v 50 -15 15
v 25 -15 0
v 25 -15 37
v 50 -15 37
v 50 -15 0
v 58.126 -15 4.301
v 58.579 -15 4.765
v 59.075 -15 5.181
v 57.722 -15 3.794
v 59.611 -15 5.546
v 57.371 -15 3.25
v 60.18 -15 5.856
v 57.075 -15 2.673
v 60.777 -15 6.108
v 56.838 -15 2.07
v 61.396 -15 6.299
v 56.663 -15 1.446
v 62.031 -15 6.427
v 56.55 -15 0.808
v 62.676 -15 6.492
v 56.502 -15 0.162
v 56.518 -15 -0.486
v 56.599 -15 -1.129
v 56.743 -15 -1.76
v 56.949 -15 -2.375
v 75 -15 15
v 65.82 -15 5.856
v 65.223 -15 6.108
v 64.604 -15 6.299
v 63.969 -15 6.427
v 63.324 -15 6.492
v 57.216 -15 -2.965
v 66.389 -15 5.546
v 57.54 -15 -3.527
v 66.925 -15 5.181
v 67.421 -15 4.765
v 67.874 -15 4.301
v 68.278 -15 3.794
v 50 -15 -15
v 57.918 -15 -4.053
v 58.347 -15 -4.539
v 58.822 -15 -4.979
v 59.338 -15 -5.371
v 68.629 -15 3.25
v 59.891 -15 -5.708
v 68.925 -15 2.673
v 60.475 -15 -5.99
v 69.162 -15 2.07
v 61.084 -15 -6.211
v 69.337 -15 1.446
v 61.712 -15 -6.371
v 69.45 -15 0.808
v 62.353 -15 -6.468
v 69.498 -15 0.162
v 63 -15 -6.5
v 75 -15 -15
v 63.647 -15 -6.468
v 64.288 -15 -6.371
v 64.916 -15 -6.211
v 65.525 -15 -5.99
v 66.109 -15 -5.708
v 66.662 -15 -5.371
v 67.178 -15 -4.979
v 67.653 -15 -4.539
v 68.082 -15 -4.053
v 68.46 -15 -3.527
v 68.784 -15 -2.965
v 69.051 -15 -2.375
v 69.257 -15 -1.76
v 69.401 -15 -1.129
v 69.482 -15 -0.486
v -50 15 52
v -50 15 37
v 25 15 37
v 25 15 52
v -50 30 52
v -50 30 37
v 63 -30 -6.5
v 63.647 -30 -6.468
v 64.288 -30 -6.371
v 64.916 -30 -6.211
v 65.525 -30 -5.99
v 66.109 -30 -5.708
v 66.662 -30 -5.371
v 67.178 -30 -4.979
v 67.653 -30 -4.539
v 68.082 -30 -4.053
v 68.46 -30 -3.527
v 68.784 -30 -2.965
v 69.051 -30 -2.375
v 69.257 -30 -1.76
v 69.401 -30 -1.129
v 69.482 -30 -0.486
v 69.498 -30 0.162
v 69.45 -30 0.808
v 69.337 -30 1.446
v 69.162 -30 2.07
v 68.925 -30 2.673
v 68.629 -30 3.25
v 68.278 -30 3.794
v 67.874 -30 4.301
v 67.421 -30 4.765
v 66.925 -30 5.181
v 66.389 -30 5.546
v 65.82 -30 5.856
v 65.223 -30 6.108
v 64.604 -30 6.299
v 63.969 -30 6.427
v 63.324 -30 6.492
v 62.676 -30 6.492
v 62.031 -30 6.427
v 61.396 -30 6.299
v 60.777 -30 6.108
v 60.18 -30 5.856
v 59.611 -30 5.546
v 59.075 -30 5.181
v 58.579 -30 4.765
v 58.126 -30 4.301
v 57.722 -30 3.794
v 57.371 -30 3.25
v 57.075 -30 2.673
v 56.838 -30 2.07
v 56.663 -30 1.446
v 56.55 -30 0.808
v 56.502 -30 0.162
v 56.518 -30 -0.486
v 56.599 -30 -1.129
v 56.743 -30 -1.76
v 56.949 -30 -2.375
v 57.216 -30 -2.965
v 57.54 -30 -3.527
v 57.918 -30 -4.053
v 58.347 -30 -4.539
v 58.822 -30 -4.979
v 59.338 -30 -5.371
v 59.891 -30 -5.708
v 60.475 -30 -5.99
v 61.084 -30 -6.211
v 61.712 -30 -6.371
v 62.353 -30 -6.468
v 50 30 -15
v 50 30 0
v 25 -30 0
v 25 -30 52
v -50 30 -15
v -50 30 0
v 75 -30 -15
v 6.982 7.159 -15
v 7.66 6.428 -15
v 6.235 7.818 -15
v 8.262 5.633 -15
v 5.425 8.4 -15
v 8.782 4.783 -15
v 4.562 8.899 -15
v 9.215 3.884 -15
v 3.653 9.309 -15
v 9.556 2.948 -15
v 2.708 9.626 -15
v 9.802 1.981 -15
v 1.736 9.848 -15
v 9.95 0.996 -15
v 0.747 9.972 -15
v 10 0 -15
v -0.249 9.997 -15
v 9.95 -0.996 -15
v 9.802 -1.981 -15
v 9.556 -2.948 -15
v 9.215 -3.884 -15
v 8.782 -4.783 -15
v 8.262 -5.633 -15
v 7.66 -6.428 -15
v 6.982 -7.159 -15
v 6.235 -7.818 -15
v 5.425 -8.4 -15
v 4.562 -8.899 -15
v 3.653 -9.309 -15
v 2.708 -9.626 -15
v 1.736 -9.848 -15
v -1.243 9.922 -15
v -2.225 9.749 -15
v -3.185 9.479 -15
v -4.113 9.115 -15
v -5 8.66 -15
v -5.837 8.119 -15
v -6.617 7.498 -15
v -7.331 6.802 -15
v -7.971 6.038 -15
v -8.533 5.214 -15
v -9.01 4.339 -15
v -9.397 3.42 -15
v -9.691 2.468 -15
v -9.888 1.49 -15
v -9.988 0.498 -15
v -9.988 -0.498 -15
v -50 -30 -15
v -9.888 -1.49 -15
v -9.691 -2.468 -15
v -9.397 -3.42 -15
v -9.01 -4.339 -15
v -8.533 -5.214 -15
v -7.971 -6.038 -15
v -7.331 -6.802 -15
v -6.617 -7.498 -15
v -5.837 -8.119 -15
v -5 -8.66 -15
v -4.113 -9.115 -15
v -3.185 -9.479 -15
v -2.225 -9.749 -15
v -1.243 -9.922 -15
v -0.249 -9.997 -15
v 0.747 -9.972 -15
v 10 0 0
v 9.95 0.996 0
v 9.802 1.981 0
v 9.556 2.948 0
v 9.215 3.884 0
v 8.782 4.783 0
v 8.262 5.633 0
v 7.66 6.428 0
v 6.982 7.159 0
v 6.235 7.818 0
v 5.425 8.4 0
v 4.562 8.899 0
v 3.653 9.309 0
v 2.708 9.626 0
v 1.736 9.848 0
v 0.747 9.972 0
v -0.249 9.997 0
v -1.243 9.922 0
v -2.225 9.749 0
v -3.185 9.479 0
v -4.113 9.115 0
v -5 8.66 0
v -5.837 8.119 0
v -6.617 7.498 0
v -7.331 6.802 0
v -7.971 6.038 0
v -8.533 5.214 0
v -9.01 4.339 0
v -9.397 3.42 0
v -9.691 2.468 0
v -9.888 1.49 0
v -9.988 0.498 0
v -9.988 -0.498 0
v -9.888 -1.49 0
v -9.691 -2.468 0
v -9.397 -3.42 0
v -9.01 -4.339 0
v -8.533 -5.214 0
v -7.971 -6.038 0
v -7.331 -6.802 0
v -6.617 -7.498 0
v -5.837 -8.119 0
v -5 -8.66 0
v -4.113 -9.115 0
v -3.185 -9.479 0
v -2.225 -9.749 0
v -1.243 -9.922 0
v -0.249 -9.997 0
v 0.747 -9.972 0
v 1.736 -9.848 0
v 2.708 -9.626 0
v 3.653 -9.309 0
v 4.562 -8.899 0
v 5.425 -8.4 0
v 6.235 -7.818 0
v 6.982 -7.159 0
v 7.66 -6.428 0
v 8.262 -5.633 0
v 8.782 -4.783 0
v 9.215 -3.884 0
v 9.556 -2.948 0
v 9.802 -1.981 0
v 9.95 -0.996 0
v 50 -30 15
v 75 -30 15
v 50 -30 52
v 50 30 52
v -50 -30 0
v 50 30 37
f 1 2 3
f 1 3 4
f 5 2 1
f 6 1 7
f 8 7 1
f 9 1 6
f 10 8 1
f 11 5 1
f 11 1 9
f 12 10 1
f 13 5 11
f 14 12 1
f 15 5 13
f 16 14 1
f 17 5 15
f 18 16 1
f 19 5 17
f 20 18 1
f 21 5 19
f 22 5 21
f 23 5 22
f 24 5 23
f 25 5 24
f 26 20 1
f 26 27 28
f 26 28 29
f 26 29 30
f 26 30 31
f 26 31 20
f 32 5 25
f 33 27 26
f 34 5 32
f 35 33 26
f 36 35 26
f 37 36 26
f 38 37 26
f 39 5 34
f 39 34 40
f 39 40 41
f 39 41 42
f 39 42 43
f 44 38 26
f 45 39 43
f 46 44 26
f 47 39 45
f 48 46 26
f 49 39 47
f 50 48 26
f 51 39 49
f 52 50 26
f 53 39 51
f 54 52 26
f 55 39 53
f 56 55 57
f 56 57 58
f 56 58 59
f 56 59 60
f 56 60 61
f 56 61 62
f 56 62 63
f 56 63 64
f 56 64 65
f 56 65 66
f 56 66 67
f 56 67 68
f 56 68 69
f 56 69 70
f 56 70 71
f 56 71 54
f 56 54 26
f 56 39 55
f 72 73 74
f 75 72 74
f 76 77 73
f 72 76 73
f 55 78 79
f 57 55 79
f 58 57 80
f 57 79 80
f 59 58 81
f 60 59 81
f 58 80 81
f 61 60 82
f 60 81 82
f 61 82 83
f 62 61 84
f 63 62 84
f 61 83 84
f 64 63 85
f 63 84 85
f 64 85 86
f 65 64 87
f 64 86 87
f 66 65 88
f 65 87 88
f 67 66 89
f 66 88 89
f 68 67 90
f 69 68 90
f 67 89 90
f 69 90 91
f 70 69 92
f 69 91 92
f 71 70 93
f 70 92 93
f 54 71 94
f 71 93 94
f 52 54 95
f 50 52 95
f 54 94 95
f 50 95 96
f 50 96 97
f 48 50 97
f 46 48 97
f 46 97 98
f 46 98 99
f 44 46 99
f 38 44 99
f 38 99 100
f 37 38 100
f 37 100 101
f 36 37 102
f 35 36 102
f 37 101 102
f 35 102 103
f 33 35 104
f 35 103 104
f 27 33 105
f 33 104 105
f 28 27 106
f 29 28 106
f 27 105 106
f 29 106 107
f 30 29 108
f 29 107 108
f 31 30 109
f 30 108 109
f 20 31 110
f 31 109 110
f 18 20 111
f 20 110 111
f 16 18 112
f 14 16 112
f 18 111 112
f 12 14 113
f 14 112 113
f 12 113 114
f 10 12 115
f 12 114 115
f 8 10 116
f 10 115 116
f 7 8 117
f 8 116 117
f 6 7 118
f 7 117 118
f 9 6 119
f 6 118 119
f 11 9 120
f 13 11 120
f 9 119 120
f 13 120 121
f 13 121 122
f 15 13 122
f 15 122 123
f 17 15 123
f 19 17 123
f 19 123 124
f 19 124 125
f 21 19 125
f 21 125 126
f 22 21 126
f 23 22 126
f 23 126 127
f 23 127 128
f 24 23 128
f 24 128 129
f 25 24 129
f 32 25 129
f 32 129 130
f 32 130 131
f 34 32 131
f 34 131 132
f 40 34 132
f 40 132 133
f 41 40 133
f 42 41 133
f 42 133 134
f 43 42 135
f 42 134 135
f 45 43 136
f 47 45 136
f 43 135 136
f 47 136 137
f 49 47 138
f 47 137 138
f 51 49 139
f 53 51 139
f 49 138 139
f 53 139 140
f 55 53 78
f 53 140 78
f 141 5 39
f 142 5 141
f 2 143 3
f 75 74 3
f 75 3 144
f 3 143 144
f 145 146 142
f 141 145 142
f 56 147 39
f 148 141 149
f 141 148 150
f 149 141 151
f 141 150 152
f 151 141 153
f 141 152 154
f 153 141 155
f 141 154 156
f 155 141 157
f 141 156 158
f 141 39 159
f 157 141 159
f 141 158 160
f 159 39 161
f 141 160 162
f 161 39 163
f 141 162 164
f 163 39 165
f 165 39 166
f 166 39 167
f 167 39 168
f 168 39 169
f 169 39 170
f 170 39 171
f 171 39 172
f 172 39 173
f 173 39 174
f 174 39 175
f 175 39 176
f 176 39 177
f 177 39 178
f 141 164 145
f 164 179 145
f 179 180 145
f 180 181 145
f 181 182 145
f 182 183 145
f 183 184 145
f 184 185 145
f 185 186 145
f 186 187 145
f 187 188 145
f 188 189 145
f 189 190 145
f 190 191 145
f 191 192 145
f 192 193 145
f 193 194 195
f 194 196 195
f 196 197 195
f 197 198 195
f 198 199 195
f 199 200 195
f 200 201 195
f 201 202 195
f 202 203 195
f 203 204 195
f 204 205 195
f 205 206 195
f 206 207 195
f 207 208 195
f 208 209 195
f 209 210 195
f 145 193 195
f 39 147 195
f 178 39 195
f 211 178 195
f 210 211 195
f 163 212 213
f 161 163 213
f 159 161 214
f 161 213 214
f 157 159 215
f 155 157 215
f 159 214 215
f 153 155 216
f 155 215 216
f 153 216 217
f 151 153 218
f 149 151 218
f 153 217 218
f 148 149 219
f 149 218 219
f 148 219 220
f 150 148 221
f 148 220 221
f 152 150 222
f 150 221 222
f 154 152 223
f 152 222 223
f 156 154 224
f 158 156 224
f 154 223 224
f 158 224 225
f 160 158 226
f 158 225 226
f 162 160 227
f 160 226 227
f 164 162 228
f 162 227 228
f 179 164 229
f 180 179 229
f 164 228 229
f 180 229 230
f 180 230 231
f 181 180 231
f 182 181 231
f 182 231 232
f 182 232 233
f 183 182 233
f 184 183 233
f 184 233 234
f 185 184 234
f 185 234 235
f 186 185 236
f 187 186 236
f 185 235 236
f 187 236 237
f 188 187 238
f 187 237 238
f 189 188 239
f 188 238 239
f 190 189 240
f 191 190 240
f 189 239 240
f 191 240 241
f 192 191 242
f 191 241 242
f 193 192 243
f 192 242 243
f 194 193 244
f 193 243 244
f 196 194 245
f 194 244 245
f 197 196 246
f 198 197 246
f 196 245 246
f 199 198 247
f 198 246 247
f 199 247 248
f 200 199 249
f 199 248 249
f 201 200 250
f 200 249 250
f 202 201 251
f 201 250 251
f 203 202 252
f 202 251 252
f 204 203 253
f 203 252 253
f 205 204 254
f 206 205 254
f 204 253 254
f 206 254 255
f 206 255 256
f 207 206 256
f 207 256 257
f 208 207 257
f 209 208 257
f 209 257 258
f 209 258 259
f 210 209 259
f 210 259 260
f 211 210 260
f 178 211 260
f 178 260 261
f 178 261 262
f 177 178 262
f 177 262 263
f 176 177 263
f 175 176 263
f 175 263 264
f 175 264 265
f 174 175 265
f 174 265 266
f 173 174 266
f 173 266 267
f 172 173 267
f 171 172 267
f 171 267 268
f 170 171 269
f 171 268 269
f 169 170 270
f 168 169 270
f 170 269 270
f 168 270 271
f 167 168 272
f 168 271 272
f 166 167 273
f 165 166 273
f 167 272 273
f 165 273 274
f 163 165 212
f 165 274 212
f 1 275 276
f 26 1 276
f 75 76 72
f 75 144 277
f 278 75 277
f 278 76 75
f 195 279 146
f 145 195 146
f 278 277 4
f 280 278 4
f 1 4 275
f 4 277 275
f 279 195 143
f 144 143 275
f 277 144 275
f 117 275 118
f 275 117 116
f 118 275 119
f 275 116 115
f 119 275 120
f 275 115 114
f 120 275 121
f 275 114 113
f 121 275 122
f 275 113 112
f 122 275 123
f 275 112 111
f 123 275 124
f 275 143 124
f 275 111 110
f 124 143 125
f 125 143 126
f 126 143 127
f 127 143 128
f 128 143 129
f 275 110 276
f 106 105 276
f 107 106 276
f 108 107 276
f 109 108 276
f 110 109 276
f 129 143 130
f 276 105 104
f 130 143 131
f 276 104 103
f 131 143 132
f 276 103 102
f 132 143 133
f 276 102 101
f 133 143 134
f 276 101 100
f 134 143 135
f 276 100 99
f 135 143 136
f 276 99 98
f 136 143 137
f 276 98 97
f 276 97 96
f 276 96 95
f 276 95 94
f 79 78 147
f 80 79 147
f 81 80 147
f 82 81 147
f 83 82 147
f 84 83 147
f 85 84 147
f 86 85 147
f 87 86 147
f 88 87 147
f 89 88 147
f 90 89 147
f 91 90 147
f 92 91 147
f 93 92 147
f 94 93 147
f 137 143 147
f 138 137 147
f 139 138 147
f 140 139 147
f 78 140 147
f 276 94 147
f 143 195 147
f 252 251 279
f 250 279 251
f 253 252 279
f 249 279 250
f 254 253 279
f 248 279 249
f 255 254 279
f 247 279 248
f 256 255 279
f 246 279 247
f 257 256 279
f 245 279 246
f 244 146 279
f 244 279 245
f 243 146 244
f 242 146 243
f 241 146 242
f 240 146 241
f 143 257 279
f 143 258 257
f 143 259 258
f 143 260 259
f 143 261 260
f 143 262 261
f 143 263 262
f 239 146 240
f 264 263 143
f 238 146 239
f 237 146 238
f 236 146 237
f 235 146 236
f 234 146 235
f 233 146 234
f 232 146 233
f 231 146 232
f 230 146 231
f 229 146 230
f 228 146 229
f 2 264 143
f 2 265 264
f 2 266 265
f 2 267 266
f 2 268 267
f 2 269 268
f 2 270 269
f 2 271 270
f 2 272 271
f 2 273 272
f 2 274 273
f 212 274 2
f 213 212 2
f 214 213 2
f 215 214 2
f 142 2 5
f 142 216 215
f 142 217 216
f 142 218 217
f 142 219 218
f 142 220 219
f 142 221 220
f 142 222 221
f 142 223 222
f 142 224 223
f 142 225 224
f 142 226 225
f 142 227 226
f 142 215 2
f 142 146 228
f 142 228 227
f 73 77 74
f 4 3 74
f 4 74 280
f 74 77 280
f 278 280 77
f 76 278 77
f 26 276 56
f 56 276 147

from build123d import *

# Parameters (mm, degrees)
SZKIC1_W                    = 100
SZKIC1_H                    = 60
SZKIC1_R                    = 10
DODANIE_WYCI_GNI_CIE1_DEPTH = 15
DODANIE_WYCI_GNI_CIE2_DEPTH = 15
SZKIC3_R                    = 6.5
DODANIE_WYCI_GNI_CIE5_DEPTH = 15


with BuildPart() as part:
    # Szkic1 → Dodanie-wyciągnięcie1 (new body)
    with BuildSketch(Plane.XY):
        Rectangle(SZKIC1_W, SZKIC1_H)
        Circle(SZKIC1_R, mode=Mode.SUBTRACT)
    extrude(amount=-DODANIE_WYCI_GNI_CIE1_DEPTH)



with BuildPart() as body_2:
    # Szkic2 → Dodanie-wyciągnięcie2 (new body)
    with BuildSketch(Plane.XY.offset(37)):
        Polygon((-50, 30), (-50, 15), (25, 15), (25, -30), (50, -30), (50, 30), align=None)
    extrude(amount=DODANIE_WYCI_GNI_CIE2_DEPTH)


with BuildPart() as part_1:
    add(part.part)

    add(body_2.part)  # Dodanie-wyciągnięcie5 merges body 2
    # Szkic3 → Dodanie-wyciągnięcie5 (add)
    with BuildSketch(Plane(origin=(0, -30, 0), x_dir=(-1, 0, 0), z_dir=(0, -1, 0))):
        Polygon((-25, 0), (-25, -37), (-50, -37), (-50, -15), (-75, -15), (-75, 15), (-50, 15), (-50, 0), align=None)
        with Locations(Location((-63, 0, 0), (0, 0, 90))):
            Circle(SZKIC3_R, mode=Mode.SUBTRACT)
    extrude(amount=-DODANIE_WYCI_GNI_CIE5_DEPTH)


solid = part_1.part
